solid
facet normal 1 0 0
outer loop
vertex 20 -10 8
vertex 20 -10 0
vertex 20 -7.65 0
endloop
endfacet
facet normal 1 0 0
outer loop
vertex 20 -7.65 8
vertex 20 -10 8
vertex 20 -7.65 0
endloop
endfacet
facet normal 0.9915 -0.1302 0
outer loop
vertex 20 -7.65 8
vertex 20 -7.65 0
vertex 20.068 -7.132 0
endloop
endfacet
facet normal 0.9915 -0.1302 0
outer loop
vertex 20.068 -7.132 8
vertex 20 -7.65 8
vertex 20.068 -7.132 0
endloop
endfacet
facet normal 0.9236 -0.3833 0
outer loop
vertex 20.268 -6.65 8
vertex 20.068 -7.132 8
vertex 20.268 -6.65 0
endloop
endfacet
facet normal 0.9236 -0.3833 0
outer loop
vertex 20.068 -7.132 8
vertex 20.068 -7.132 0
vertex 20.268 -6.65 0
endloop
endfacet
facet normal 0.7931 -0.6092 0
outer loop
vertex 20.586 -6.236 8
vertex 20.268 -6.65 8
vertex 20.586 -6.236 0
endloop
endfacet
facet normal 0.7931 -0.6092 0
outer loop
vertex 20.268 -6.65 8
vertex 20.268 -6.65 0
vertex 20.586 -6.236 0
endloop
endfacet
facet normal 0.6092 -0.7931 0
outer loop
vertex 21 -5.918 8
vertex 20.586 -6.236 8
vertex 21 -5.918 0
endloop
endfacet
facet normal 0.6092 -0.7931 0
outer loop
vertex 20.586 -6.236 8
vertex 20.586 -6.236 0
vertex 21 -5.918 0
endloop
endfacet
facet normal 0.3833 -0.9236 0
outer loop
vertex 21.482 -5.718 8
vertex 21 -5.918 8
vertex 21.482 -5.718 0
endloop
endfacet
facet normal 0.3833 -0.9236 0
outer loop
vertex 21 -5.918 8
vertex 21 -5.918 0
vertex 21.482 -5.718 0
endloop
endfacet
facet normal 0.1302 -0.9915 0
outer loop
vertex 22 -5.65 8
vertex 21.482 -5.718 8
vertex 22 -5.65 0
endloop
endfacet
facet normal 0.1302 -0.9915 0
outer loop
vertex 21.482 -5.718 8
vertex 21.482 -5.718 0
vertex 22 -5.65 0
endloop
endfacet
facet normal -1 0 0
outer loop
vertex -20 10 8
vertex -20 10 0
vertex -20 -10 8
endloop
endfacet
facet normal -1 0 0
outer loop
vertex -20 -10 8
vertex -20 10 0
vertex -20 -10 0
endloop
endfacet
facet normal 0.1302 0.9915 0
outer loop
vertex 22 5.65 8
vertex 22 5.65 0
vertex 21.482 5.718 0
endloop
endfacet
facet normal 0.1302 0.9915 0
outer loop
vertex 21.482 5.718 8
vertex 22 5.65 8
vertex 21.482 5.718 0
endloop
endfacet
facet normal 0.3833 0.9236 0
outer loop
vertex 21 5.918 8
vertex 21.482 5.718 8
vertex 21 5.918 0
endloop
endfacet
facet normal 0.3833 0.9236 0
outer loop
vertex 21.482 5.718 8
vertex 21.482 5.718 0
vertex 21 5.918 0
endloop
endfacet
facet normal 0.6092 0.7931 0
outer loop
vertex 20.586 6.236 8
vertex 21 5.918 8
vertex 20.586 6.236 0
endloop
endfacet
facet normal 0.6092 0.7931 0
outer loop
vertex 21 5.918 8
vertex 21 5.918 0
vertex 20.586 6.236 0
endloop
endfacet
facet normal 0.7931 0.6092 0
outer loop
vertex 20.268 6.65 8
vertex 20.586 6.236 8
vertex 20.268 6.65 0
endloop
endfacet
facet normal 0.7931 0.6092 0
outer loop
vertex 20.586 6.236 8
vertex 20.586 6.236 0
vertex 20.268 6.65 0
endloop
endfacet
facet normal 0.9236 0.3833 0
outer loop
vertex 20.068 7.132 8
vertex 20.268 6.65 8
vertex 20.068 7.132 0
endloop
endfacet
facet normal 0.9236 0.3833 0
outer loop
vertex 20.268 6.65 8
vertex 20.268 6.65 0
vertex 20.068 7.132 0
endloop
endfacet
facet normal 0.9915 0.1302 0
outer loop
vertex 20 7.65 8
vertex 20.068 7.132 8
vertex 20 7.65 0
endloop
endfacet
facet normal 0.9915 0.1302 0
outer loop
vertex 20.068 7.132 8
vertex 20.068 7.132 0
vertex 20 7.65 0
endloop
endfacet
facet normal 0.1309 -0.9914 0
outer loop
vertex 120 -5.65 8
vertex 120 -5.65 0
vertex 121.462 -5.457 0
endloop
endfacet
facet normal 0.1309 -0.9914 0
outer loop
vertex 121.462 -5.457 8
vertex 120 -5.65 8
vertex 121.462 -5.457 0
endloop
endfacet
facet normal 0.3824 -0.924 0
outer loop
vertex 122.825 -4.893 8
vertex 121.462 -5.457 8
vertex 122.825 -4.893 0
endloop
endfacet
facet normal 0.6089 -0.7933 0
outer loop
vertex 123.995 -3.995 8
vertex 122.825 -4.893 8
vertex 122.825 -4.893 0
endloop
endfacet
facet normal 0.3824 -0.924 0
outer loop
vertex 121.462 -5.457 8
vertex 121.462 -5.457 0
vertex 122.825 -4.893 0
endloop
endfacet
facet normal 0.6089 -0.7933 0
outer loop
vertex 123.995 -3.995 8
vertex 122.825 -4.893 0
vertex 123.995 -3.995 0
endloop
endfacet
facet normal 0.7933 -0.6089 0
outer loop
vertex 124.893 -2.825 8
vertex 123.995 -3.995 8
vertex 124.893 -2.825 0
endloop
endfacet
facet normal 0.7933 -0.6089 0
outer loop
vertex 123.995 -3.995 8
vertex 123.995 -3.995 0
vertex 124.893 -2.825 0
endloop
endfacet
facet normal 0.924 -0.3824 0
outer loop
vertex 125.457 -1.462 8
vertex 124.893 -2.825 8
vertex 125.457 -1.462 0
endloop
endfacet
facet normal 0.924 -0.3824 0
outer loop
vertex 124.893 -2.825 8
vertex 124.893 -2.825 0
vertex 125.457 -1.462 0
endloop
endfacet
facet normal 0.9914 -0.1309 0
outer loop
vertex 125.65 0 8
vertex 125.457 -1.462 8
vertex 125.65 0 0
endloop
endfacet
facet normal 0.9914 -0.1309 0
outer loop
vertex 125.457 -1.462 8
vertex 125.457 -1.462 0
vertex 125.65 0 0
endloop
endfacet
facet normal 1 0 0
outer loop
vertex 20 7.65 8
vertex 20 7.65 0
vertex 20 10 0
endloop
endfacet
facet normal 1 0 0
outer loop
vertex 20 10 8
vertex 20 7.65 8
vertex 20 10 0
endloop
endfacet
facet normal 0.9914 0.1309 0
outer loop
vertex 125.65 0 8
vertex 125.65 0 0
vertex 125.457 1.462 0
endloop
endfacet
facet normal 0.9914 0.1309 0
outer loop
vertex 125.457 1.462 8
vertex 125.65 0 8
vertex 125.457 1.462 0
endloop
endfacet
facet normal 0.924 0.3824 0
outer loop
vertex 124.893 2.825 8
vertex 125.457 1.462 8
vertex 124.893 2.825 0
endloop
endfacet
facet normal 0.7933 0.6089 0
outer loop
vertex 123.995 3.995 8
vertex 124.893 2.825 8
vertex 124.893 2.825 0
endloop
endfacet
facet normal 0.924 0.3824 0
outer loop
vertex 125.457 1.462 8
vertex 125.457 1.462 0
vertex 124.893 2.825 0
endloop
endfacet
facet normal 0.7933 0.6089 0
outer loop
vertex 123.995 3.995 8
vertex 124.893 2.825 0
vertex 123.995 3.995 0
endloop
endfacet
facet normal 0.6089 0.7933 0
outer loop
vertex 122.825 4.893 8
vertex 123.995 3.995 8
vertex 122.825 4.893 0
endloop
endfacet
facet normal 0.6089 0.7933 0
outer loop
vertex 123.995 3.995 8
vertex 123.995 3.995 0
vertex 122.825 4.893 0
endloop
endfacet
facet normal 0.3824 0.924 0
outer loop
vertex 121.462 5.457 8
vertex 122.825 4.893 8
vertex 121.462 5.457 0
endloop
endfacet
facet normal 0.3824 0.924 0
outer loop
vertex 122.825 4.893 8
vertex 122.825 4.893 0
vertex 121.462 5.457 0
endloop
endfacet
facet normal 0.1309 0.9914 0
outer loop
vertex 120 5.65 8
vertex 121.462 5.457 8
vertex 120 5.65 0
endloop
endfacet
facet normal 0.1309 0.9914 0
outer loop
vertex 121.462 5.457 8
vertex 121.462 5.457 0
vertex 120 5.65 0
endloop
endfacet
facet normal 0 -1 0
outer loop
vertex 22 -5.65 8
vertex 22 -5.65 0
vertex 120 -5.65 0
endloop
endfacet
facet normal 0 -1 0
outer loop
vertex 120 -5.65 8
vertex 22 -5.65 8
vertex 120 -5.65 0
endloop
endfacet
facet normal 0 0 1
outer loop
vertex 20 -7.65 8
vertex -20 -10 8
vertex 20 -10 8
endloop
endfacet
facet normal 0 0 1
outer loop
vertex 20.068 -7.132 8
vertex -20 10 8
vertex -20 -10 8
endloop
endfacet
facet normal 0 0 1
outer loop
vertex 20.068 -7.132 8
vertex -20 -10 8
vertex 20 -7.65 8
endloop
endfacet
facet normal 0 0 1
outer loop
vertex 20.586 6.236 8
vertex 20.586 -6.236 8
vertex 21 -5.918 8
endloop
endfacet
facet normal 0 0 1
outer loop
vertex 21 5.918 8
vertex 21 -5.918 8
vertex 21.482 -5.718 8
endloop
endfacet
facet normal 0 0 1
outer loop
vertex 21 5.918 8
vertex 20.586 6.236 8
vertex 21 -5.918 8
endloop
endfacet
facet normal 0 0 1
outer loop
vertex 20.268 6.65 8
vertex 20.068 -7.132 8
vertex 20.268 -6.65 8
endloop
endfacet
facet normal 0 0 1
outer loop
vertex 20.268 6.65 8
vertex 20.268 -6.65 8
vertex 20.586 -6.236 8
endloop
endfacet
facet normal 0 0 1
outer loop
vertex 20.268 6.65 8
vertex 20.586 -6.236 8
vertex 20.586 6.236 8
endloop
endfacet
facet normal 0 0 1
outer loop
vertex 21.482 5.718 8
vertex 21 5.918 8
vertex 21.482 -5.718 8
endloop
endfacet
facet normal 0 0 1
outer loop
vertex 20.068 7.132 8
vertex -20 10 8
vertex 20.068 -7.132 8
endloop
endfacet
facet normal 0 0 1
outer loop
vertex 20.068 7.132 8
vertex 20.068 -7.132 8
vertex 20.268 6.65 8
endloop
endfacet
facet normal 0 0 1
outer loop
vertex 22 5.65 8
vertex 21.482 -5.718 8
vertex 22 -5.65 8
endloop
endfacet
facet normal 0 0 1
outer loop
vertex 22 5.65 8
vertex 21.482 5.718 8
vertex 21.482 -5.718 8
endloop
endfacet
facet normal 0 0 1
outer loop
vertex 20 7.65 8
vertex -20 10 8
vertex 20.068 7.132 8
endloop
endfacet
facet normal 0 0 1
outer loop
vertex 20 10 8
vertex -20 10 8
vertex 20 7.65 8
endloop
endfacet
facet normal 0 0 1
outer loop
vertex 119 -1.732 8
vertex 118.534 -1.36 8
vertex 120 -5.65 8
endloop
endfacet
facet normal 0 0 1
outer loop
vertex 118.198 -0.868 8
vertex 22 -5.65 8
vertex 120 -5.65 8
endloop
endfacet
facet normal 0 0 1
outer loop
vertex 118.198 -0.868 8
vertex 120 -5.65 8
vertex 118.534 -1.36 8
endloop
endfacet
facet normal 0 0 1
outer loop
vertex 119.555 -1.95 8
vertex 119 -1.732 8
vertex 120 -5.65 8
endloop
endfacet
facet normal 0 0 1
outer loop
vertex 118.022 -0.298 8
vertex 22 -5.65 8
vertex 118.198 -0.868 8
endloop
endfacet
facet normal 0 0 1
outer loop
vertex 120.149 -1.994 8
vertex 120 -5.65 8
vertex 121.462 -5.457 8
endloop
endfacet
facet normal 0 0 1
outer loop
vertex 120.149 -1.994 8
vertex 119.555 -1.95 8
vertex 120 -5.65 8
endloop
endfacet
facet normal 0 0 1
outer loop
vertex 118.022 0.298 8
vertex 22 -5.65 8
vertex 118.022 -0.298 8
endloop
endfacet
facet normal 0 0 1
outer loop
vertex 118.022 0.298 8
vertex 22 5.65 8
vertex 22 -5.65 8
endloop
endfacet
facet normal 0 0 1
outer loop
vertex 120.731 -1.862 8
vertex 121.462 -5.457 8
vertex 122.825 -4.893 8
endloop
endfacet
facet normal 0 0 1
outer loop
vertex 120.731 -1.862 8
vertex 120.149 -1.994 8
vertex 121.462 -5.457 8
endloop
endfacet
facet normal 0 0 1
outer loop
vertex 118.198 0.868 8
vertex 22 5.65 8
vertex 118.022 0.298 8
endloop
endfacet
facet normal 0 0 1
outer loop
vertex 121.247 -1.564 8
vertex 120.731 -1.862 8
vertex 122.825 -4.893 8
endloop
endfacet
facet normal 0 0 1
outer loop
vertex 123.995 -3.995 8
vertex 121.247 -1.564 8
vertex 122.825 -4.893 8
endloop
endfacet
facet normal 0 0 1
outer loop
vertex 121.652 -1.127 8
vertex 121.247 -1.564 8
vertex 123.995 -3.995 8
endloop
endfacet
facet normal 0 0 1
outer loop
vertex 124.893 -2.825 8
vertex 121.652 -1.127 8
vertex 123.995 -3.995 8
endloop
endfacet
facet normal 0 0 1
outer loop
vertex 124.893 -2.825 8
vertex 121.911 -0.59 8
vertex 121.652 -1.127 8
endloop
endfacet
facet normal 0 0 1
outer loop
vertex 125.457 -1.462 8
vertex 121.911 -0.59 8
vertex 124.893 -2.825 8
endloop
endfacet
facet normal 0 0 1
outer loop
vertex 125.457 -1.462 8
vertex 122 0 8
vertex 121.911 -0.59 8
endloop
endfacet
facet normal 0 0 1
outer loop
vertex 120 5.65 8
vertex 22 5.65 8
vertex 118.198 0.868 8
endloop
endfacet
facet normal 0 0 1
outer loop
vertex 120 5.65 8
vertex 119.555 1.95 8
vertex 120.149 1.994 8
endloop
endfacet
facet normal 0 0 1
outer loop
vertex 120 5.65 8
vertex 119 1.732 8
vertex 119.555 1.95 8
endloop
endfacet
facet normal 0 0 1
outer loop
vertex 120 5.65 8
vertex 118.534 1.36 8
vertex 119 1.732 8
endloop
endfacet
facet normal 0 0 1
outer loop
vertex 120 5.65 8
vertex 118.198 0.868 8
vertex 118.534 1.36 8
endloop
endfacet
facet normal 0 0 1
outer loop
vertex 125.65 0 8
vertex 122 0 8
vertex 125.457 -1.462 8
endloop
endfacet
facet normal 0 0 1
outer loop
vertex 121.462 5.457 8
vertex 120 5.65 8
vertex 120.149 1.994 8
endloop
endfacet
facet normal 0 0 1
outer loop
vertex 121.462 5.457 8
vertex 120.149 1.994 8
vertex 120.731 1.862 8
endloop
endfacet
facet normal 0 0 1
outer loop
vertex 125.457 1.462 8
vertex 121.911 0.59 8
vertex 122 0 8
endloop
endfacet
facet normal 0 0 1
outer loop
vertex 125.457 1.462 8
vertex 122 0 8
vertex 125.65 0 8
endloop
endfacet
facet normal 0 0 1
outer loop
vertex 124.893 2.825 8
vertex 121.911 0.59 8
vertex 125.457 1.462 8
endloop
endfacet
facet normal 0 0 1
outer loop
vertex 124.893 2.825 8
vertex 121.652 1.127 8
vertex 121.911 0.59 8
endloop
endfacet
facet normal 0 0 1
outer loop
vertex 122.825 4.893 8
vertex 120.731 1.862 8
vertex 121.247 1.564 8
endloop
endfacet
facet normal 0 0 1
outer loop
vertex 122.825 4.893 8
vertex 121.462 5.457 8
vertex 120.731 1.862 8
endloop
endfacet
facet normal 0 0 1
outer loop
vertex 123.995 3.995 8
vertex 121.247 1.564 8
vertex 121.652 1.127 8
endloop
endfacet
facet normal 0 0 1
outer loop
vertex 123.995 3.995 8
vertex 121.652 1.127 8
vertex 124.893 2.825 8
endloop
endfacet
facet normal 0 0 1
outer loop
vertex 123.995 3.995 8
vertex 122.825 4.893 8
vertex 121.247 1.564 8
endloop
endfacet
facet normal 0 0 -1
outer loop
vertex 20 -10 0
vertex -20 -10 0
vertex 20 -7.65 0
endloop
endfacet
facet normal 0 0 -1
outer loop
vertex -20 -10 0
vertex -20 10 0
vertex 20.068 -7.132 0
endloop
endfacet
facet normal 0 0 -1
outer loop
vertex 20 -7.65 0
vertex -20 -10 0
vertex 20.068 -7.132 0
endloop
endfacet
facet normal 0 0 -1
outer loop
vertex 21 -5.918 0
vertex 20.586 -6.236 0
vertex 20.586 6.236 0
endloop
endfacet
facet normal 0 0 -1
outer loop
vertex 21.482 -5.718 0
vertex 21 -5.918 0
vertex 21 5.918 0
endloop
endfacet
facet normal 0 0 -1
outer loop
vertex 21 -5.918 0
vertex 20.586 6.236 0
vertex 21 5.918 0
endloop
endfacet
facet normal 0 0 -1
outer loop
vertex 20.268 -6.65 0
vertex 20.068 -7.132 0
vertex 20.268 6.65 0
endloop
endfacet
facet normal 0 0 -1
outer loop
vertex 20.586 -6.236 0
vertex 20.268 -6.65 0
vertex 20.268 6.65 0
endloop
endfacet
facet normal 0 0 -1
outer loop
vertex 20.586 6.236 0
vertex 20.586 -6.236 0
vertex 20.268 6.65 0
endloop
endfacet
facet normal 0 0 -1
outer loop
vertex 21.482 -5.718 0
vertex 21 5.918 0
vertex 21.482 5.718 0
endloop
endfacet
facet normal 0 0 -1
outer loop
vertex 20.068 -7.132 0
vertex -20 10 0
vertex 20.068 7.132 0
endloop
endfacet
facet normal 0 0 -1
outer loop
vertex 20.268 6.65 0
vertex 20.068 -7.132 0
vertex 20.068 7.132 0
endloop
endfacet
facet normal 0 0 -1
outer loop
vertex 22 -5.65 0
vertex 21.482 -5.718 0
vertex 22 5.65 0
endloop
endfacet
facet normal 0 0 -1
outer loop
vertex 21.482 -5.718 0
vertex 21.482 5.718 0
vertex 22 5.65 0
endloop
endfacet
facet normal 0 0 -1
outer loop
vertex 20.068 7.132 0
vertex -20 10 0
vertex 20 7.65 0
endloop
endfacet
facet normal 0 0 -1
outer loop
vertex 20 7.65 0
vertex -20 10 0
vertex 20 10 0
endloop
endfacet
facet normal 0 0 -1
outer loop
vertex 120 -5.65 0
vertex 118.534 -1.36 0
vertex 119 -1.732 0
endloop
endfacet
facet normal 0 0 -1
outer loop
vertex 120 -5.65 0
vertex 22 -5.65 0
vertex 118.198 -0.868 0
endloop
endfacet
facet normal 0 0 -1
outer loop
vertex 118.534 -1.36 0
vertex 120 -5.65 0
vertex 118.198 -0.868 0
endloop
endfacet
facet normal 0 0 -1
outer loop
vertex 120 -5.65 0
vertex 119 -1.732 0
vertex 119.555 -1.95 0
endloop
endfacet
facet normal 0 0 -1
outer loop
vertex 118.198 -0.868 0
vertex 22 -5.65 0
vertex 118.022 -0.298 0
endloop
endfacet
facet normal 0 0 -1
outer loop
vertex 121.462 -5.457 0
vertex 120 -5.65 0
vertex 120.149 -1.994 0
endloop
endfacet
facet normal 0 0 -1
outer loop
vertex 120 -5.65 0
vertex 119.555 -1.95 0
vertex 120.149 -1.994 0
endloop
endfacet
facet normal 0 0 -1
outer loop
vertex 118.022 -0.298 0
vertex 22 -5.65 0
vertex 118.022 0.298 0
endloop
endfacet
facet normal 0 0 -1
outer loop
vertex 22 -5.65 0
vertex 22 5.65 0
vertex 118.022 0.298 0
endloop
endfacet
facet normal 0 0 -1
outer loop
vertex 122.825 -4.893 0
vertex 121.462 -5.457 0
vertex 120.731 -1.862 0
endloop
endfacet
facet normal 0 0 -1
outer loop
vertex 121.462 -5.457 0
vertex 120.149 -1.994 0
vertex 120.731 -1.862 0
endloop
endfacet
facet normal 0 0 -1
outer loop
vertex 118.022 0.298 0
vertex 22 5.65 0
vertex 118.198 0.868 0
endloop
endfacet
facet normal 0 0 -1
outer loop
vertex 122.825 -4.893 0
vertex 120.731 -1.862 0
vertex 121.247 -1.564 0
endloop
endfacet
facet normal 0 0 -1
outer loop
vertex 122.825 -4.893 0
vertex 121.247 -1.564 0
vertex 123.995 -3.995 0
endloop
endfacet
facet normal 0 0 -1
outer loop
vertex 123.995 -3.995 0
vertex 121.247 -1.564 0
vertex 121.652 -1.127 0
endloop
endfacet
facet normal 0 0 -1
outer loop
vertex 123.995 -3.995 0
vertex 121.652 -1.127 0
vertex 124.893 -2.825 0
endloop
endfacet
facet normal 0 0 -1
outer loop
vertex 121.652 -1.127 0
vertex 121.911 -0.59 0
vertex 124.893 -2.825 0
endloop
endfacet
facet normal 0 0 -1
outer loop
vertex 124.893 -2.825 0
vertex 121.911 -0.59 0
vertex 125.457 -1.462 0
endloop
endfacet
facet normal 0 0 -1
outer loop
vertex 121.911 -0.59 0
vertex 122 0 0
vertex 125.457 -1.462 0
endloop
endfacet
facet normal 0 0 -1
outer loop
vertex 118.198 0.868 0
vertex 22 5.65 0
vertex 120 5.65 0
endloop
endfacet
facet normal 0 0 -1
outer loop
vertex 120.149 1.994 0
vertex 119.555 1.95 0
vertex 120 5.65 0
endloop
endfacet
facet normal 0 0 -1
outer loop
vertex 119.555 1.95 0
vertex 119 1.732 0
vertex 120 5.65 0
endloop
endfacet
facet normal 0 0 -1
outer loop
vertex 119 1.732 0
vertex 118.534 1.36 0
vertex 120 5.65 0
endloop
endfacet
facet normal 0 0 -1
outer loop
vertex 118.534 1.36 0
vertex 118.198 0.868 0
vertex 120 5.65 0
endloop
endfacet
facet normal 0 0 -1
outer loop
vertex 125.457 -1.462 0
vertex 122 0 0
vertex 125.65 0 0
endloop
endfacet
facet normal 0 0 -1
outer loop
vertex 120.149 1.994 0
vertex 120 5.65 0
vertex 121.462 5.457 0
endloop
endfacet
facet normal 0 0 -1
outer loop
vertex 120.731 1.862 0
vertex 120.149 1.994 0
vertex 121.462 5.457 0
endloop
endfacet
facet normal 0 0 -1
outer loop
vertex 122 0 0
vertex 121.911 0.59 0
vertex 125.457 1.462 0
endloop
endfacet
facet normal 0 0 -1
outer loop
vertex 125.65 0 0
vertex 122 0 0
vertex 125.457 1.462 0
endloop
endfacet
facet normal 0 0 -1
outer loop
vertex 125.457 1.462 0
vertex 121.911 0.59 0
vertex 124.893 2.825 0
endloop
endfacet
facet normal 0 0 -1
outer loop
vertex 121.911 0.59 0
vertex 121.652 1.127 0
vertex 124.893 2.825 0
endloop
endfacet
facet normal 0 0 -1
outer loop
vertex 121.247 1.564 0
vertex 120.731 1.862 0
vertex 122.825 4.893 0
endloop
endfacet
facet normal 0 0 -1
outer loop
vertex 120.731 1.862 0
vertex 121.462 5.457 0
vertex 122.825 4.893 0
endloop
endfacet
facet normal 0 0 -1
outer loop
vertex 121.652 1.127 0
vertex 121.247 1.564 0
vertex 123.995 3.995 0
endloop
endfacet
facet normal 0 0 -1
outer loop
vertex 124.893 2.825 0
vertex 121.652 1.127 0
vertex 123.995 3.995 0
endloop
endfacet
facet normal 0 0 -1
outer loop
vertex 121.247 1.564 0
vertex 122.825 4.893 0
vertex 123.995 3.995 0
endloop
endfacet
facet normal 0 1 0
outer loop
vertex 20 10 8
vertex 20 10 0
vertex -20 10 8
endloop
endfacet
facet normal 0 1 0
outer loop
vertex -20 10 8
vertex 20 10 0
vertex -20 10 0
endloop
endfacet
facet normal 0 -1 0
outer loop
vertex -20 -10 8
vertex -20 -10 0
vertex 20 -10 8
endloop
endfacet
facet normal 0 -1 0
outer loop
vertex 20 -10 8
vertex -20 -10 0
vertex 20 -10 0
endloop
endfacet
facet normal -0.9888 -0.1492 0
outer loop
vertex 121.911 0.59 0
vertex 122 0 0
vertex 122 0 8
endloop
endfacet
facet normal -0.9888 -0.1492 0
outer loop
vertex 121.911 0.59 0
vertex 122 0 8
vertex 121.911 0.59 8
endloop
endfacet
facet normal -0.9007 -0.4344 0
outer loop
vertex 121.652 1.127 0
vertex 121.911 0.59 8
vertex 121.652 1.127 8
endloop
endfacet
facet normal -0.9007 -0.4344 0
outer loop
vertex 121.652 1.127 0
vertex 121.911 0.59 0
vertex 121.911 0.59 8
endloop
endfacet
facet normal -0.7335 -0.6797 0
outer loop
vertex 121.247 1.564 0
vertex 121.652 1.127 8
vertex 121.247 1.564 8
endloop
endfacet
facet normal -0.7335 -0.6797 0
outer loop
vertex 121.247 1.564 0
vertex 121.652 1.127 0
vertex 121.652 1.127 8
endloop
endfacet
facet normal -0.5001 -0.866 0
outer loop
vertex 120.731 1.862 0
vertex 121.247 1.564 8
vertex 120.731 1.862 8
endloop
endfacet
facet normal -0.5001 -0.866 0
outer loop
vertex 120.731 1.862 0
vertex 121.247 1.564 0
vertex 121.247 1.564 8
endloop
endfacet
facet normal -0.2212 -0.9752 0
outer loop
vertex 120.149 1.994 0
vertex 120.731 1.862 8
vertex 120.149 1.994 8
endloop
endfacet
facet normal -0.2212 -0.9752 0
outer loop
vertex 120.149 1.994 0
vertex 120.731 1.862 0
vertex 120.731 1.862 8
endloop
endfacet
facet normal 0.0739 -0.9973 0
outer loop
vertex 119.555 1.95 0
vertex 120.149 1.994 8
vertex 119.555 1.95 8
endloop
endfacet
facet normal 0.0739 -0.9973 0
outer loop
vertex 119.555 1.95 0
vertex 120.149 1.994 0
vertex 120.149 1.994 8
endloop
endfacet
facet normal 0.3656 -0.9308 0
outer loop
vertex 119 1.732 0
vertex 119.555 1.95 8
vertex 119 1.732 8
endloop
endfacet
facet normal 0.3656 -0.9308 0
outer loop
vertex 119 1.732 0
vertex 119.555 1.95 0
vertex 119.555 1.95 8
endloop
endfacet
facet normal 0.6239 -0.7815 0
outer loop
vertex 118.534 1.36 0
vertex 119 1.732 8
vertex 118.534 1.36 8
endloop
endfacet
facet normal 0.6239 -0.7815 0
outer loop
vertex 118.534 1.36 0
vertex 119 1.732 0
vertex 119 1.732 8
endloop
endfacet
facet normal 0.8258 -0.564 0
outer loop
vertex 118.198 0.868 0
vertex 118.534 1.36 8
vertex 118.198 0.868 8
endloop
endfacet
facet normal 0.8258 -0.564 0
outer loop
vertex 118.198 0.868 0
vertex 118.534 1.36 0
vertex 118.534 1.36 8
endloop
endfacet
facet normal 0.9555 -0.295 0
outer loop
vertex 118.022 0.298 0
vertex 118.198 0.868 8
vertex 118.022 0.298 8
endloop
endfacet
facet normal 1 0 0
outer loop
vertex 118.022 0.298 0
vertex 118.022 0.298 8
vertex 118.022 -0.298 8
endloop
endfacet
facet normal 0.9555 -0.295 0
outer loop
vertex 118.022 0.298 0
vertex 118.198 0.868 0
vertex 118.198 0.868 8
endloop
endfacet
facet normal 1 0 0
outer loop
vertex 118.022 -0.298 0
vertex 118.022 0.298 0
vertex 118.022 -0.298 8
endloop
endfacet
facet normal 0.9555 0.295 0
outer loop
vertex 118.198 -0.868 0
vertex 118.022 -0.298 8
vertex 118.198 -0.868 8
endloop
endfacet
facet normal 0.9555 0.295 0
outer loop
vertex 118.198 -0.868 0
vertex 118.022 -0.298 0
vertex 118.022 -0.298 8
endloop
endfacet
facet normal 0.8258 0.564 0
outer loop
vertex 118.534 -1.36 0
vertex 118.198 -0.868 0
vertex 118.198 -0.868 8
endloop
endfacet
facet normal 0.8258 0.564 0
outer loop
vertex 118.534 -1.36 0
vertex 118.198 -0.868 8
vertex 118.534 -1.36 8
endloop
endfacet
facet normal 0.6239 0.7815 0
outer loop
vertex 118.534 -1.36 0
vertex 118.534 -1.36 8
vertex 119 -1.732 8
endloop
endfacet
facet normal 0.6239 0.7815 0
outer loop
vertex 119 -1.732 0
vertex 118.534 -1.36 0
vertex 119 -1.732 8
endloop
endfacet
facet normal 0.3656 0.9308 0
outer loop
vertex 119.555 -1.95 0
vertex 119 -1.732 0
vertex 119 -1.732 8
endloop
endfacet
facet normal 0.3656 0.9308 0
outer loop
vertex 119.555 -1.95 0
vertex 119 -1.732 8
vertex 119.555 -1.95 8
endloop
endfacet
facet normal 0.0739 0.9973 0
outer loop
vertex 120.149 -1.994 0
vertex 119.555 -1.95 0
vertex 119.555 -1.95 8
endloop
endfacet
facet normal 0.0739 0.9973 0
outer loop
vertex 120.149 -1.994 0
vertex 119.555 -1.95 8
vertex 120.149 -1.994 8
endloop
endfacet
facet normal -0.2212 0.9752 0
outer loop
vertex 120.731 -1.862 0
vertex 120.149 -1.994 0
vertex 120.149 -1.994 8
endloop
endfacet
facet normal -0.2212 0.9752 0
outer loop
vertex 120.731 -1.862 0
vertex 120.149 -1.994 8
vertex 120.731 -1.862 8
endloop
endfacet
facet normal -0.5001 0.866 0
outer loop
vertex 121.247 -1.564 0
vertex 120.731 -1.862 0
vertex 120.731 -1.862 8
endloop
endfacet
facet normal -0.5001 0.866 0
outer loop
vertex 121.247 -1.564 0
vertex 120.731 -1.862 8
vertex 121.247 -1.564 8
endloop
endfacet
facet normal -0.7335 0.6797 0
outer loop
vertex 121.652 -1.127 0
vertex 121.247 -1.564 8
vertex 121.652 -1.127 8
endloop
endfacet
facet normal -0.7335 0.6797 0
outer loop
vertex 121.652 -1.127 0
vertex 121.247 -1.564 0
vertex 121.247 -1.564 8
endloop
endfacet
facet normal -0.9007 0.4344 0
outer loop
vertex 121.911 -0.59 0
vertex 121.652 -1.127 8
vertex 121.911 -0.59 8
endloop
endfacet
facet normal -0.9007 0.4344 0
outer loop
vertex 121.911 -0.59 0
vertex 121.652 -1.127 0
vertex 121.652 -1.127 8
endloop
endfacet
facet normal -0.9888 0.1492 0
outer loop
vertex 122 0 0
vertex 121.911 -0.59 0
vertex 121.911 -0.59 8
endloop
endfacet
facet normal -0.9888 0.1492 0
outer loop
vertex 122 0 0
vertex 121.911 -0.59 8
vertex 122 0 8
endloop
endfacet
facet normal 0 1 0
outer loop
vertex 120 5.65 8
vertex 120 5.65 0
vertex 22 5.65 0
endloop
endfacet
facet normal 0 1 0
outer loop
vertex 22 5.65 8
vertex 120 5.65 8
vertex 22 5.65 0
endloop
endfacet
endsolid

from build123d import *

# Parameters (mm, degrees)
F0_R     = 2
F1_DEPTH = 8


with BuildPart() as f1:
    # F0 (on Top) → F1 (new body)
    with BuildSketch(Plane.XY):
        with BuildLine():
            Line((-20, -10), (20, -10))
            Line((20, -10), (20, -7.65))
            ThreePointArc((20, -7.65), (20.585786, -6.235786), (22, -5.65))
            Line((22, -5.65), (120, -5.65))
            ThreePointArc((120, -5.65), (114.35, 0), (120, 5.65))
            Line((120, 5.65), (22, 5.65))
            ThreePointArc((22, 5.65), (20.585786, 6.235786), (20, 7.65))
            Line((20, 7.65), (20, 10))
            Line((20, 10), (-20, 10))
            Line((-20, 10), (-20, -10))
        make_face()
        with BuildLine():
            ThreePointArc((120, 5.65), (114.35, 0), (120, -5.65))
            ThreePointArc((120, -5.65), (123.995153, -3.995153), (125.65, 0))
            ThreePointArc((125.65, 0), (123.995153, 3.995153), (120, 5.65))
        make_face()
        with Locations((120, 0)):
            Circle(F0_R, mode=Mode.SUBTRACT)
    extrude(amount=F1_DEPTH)


solid = f1.part
